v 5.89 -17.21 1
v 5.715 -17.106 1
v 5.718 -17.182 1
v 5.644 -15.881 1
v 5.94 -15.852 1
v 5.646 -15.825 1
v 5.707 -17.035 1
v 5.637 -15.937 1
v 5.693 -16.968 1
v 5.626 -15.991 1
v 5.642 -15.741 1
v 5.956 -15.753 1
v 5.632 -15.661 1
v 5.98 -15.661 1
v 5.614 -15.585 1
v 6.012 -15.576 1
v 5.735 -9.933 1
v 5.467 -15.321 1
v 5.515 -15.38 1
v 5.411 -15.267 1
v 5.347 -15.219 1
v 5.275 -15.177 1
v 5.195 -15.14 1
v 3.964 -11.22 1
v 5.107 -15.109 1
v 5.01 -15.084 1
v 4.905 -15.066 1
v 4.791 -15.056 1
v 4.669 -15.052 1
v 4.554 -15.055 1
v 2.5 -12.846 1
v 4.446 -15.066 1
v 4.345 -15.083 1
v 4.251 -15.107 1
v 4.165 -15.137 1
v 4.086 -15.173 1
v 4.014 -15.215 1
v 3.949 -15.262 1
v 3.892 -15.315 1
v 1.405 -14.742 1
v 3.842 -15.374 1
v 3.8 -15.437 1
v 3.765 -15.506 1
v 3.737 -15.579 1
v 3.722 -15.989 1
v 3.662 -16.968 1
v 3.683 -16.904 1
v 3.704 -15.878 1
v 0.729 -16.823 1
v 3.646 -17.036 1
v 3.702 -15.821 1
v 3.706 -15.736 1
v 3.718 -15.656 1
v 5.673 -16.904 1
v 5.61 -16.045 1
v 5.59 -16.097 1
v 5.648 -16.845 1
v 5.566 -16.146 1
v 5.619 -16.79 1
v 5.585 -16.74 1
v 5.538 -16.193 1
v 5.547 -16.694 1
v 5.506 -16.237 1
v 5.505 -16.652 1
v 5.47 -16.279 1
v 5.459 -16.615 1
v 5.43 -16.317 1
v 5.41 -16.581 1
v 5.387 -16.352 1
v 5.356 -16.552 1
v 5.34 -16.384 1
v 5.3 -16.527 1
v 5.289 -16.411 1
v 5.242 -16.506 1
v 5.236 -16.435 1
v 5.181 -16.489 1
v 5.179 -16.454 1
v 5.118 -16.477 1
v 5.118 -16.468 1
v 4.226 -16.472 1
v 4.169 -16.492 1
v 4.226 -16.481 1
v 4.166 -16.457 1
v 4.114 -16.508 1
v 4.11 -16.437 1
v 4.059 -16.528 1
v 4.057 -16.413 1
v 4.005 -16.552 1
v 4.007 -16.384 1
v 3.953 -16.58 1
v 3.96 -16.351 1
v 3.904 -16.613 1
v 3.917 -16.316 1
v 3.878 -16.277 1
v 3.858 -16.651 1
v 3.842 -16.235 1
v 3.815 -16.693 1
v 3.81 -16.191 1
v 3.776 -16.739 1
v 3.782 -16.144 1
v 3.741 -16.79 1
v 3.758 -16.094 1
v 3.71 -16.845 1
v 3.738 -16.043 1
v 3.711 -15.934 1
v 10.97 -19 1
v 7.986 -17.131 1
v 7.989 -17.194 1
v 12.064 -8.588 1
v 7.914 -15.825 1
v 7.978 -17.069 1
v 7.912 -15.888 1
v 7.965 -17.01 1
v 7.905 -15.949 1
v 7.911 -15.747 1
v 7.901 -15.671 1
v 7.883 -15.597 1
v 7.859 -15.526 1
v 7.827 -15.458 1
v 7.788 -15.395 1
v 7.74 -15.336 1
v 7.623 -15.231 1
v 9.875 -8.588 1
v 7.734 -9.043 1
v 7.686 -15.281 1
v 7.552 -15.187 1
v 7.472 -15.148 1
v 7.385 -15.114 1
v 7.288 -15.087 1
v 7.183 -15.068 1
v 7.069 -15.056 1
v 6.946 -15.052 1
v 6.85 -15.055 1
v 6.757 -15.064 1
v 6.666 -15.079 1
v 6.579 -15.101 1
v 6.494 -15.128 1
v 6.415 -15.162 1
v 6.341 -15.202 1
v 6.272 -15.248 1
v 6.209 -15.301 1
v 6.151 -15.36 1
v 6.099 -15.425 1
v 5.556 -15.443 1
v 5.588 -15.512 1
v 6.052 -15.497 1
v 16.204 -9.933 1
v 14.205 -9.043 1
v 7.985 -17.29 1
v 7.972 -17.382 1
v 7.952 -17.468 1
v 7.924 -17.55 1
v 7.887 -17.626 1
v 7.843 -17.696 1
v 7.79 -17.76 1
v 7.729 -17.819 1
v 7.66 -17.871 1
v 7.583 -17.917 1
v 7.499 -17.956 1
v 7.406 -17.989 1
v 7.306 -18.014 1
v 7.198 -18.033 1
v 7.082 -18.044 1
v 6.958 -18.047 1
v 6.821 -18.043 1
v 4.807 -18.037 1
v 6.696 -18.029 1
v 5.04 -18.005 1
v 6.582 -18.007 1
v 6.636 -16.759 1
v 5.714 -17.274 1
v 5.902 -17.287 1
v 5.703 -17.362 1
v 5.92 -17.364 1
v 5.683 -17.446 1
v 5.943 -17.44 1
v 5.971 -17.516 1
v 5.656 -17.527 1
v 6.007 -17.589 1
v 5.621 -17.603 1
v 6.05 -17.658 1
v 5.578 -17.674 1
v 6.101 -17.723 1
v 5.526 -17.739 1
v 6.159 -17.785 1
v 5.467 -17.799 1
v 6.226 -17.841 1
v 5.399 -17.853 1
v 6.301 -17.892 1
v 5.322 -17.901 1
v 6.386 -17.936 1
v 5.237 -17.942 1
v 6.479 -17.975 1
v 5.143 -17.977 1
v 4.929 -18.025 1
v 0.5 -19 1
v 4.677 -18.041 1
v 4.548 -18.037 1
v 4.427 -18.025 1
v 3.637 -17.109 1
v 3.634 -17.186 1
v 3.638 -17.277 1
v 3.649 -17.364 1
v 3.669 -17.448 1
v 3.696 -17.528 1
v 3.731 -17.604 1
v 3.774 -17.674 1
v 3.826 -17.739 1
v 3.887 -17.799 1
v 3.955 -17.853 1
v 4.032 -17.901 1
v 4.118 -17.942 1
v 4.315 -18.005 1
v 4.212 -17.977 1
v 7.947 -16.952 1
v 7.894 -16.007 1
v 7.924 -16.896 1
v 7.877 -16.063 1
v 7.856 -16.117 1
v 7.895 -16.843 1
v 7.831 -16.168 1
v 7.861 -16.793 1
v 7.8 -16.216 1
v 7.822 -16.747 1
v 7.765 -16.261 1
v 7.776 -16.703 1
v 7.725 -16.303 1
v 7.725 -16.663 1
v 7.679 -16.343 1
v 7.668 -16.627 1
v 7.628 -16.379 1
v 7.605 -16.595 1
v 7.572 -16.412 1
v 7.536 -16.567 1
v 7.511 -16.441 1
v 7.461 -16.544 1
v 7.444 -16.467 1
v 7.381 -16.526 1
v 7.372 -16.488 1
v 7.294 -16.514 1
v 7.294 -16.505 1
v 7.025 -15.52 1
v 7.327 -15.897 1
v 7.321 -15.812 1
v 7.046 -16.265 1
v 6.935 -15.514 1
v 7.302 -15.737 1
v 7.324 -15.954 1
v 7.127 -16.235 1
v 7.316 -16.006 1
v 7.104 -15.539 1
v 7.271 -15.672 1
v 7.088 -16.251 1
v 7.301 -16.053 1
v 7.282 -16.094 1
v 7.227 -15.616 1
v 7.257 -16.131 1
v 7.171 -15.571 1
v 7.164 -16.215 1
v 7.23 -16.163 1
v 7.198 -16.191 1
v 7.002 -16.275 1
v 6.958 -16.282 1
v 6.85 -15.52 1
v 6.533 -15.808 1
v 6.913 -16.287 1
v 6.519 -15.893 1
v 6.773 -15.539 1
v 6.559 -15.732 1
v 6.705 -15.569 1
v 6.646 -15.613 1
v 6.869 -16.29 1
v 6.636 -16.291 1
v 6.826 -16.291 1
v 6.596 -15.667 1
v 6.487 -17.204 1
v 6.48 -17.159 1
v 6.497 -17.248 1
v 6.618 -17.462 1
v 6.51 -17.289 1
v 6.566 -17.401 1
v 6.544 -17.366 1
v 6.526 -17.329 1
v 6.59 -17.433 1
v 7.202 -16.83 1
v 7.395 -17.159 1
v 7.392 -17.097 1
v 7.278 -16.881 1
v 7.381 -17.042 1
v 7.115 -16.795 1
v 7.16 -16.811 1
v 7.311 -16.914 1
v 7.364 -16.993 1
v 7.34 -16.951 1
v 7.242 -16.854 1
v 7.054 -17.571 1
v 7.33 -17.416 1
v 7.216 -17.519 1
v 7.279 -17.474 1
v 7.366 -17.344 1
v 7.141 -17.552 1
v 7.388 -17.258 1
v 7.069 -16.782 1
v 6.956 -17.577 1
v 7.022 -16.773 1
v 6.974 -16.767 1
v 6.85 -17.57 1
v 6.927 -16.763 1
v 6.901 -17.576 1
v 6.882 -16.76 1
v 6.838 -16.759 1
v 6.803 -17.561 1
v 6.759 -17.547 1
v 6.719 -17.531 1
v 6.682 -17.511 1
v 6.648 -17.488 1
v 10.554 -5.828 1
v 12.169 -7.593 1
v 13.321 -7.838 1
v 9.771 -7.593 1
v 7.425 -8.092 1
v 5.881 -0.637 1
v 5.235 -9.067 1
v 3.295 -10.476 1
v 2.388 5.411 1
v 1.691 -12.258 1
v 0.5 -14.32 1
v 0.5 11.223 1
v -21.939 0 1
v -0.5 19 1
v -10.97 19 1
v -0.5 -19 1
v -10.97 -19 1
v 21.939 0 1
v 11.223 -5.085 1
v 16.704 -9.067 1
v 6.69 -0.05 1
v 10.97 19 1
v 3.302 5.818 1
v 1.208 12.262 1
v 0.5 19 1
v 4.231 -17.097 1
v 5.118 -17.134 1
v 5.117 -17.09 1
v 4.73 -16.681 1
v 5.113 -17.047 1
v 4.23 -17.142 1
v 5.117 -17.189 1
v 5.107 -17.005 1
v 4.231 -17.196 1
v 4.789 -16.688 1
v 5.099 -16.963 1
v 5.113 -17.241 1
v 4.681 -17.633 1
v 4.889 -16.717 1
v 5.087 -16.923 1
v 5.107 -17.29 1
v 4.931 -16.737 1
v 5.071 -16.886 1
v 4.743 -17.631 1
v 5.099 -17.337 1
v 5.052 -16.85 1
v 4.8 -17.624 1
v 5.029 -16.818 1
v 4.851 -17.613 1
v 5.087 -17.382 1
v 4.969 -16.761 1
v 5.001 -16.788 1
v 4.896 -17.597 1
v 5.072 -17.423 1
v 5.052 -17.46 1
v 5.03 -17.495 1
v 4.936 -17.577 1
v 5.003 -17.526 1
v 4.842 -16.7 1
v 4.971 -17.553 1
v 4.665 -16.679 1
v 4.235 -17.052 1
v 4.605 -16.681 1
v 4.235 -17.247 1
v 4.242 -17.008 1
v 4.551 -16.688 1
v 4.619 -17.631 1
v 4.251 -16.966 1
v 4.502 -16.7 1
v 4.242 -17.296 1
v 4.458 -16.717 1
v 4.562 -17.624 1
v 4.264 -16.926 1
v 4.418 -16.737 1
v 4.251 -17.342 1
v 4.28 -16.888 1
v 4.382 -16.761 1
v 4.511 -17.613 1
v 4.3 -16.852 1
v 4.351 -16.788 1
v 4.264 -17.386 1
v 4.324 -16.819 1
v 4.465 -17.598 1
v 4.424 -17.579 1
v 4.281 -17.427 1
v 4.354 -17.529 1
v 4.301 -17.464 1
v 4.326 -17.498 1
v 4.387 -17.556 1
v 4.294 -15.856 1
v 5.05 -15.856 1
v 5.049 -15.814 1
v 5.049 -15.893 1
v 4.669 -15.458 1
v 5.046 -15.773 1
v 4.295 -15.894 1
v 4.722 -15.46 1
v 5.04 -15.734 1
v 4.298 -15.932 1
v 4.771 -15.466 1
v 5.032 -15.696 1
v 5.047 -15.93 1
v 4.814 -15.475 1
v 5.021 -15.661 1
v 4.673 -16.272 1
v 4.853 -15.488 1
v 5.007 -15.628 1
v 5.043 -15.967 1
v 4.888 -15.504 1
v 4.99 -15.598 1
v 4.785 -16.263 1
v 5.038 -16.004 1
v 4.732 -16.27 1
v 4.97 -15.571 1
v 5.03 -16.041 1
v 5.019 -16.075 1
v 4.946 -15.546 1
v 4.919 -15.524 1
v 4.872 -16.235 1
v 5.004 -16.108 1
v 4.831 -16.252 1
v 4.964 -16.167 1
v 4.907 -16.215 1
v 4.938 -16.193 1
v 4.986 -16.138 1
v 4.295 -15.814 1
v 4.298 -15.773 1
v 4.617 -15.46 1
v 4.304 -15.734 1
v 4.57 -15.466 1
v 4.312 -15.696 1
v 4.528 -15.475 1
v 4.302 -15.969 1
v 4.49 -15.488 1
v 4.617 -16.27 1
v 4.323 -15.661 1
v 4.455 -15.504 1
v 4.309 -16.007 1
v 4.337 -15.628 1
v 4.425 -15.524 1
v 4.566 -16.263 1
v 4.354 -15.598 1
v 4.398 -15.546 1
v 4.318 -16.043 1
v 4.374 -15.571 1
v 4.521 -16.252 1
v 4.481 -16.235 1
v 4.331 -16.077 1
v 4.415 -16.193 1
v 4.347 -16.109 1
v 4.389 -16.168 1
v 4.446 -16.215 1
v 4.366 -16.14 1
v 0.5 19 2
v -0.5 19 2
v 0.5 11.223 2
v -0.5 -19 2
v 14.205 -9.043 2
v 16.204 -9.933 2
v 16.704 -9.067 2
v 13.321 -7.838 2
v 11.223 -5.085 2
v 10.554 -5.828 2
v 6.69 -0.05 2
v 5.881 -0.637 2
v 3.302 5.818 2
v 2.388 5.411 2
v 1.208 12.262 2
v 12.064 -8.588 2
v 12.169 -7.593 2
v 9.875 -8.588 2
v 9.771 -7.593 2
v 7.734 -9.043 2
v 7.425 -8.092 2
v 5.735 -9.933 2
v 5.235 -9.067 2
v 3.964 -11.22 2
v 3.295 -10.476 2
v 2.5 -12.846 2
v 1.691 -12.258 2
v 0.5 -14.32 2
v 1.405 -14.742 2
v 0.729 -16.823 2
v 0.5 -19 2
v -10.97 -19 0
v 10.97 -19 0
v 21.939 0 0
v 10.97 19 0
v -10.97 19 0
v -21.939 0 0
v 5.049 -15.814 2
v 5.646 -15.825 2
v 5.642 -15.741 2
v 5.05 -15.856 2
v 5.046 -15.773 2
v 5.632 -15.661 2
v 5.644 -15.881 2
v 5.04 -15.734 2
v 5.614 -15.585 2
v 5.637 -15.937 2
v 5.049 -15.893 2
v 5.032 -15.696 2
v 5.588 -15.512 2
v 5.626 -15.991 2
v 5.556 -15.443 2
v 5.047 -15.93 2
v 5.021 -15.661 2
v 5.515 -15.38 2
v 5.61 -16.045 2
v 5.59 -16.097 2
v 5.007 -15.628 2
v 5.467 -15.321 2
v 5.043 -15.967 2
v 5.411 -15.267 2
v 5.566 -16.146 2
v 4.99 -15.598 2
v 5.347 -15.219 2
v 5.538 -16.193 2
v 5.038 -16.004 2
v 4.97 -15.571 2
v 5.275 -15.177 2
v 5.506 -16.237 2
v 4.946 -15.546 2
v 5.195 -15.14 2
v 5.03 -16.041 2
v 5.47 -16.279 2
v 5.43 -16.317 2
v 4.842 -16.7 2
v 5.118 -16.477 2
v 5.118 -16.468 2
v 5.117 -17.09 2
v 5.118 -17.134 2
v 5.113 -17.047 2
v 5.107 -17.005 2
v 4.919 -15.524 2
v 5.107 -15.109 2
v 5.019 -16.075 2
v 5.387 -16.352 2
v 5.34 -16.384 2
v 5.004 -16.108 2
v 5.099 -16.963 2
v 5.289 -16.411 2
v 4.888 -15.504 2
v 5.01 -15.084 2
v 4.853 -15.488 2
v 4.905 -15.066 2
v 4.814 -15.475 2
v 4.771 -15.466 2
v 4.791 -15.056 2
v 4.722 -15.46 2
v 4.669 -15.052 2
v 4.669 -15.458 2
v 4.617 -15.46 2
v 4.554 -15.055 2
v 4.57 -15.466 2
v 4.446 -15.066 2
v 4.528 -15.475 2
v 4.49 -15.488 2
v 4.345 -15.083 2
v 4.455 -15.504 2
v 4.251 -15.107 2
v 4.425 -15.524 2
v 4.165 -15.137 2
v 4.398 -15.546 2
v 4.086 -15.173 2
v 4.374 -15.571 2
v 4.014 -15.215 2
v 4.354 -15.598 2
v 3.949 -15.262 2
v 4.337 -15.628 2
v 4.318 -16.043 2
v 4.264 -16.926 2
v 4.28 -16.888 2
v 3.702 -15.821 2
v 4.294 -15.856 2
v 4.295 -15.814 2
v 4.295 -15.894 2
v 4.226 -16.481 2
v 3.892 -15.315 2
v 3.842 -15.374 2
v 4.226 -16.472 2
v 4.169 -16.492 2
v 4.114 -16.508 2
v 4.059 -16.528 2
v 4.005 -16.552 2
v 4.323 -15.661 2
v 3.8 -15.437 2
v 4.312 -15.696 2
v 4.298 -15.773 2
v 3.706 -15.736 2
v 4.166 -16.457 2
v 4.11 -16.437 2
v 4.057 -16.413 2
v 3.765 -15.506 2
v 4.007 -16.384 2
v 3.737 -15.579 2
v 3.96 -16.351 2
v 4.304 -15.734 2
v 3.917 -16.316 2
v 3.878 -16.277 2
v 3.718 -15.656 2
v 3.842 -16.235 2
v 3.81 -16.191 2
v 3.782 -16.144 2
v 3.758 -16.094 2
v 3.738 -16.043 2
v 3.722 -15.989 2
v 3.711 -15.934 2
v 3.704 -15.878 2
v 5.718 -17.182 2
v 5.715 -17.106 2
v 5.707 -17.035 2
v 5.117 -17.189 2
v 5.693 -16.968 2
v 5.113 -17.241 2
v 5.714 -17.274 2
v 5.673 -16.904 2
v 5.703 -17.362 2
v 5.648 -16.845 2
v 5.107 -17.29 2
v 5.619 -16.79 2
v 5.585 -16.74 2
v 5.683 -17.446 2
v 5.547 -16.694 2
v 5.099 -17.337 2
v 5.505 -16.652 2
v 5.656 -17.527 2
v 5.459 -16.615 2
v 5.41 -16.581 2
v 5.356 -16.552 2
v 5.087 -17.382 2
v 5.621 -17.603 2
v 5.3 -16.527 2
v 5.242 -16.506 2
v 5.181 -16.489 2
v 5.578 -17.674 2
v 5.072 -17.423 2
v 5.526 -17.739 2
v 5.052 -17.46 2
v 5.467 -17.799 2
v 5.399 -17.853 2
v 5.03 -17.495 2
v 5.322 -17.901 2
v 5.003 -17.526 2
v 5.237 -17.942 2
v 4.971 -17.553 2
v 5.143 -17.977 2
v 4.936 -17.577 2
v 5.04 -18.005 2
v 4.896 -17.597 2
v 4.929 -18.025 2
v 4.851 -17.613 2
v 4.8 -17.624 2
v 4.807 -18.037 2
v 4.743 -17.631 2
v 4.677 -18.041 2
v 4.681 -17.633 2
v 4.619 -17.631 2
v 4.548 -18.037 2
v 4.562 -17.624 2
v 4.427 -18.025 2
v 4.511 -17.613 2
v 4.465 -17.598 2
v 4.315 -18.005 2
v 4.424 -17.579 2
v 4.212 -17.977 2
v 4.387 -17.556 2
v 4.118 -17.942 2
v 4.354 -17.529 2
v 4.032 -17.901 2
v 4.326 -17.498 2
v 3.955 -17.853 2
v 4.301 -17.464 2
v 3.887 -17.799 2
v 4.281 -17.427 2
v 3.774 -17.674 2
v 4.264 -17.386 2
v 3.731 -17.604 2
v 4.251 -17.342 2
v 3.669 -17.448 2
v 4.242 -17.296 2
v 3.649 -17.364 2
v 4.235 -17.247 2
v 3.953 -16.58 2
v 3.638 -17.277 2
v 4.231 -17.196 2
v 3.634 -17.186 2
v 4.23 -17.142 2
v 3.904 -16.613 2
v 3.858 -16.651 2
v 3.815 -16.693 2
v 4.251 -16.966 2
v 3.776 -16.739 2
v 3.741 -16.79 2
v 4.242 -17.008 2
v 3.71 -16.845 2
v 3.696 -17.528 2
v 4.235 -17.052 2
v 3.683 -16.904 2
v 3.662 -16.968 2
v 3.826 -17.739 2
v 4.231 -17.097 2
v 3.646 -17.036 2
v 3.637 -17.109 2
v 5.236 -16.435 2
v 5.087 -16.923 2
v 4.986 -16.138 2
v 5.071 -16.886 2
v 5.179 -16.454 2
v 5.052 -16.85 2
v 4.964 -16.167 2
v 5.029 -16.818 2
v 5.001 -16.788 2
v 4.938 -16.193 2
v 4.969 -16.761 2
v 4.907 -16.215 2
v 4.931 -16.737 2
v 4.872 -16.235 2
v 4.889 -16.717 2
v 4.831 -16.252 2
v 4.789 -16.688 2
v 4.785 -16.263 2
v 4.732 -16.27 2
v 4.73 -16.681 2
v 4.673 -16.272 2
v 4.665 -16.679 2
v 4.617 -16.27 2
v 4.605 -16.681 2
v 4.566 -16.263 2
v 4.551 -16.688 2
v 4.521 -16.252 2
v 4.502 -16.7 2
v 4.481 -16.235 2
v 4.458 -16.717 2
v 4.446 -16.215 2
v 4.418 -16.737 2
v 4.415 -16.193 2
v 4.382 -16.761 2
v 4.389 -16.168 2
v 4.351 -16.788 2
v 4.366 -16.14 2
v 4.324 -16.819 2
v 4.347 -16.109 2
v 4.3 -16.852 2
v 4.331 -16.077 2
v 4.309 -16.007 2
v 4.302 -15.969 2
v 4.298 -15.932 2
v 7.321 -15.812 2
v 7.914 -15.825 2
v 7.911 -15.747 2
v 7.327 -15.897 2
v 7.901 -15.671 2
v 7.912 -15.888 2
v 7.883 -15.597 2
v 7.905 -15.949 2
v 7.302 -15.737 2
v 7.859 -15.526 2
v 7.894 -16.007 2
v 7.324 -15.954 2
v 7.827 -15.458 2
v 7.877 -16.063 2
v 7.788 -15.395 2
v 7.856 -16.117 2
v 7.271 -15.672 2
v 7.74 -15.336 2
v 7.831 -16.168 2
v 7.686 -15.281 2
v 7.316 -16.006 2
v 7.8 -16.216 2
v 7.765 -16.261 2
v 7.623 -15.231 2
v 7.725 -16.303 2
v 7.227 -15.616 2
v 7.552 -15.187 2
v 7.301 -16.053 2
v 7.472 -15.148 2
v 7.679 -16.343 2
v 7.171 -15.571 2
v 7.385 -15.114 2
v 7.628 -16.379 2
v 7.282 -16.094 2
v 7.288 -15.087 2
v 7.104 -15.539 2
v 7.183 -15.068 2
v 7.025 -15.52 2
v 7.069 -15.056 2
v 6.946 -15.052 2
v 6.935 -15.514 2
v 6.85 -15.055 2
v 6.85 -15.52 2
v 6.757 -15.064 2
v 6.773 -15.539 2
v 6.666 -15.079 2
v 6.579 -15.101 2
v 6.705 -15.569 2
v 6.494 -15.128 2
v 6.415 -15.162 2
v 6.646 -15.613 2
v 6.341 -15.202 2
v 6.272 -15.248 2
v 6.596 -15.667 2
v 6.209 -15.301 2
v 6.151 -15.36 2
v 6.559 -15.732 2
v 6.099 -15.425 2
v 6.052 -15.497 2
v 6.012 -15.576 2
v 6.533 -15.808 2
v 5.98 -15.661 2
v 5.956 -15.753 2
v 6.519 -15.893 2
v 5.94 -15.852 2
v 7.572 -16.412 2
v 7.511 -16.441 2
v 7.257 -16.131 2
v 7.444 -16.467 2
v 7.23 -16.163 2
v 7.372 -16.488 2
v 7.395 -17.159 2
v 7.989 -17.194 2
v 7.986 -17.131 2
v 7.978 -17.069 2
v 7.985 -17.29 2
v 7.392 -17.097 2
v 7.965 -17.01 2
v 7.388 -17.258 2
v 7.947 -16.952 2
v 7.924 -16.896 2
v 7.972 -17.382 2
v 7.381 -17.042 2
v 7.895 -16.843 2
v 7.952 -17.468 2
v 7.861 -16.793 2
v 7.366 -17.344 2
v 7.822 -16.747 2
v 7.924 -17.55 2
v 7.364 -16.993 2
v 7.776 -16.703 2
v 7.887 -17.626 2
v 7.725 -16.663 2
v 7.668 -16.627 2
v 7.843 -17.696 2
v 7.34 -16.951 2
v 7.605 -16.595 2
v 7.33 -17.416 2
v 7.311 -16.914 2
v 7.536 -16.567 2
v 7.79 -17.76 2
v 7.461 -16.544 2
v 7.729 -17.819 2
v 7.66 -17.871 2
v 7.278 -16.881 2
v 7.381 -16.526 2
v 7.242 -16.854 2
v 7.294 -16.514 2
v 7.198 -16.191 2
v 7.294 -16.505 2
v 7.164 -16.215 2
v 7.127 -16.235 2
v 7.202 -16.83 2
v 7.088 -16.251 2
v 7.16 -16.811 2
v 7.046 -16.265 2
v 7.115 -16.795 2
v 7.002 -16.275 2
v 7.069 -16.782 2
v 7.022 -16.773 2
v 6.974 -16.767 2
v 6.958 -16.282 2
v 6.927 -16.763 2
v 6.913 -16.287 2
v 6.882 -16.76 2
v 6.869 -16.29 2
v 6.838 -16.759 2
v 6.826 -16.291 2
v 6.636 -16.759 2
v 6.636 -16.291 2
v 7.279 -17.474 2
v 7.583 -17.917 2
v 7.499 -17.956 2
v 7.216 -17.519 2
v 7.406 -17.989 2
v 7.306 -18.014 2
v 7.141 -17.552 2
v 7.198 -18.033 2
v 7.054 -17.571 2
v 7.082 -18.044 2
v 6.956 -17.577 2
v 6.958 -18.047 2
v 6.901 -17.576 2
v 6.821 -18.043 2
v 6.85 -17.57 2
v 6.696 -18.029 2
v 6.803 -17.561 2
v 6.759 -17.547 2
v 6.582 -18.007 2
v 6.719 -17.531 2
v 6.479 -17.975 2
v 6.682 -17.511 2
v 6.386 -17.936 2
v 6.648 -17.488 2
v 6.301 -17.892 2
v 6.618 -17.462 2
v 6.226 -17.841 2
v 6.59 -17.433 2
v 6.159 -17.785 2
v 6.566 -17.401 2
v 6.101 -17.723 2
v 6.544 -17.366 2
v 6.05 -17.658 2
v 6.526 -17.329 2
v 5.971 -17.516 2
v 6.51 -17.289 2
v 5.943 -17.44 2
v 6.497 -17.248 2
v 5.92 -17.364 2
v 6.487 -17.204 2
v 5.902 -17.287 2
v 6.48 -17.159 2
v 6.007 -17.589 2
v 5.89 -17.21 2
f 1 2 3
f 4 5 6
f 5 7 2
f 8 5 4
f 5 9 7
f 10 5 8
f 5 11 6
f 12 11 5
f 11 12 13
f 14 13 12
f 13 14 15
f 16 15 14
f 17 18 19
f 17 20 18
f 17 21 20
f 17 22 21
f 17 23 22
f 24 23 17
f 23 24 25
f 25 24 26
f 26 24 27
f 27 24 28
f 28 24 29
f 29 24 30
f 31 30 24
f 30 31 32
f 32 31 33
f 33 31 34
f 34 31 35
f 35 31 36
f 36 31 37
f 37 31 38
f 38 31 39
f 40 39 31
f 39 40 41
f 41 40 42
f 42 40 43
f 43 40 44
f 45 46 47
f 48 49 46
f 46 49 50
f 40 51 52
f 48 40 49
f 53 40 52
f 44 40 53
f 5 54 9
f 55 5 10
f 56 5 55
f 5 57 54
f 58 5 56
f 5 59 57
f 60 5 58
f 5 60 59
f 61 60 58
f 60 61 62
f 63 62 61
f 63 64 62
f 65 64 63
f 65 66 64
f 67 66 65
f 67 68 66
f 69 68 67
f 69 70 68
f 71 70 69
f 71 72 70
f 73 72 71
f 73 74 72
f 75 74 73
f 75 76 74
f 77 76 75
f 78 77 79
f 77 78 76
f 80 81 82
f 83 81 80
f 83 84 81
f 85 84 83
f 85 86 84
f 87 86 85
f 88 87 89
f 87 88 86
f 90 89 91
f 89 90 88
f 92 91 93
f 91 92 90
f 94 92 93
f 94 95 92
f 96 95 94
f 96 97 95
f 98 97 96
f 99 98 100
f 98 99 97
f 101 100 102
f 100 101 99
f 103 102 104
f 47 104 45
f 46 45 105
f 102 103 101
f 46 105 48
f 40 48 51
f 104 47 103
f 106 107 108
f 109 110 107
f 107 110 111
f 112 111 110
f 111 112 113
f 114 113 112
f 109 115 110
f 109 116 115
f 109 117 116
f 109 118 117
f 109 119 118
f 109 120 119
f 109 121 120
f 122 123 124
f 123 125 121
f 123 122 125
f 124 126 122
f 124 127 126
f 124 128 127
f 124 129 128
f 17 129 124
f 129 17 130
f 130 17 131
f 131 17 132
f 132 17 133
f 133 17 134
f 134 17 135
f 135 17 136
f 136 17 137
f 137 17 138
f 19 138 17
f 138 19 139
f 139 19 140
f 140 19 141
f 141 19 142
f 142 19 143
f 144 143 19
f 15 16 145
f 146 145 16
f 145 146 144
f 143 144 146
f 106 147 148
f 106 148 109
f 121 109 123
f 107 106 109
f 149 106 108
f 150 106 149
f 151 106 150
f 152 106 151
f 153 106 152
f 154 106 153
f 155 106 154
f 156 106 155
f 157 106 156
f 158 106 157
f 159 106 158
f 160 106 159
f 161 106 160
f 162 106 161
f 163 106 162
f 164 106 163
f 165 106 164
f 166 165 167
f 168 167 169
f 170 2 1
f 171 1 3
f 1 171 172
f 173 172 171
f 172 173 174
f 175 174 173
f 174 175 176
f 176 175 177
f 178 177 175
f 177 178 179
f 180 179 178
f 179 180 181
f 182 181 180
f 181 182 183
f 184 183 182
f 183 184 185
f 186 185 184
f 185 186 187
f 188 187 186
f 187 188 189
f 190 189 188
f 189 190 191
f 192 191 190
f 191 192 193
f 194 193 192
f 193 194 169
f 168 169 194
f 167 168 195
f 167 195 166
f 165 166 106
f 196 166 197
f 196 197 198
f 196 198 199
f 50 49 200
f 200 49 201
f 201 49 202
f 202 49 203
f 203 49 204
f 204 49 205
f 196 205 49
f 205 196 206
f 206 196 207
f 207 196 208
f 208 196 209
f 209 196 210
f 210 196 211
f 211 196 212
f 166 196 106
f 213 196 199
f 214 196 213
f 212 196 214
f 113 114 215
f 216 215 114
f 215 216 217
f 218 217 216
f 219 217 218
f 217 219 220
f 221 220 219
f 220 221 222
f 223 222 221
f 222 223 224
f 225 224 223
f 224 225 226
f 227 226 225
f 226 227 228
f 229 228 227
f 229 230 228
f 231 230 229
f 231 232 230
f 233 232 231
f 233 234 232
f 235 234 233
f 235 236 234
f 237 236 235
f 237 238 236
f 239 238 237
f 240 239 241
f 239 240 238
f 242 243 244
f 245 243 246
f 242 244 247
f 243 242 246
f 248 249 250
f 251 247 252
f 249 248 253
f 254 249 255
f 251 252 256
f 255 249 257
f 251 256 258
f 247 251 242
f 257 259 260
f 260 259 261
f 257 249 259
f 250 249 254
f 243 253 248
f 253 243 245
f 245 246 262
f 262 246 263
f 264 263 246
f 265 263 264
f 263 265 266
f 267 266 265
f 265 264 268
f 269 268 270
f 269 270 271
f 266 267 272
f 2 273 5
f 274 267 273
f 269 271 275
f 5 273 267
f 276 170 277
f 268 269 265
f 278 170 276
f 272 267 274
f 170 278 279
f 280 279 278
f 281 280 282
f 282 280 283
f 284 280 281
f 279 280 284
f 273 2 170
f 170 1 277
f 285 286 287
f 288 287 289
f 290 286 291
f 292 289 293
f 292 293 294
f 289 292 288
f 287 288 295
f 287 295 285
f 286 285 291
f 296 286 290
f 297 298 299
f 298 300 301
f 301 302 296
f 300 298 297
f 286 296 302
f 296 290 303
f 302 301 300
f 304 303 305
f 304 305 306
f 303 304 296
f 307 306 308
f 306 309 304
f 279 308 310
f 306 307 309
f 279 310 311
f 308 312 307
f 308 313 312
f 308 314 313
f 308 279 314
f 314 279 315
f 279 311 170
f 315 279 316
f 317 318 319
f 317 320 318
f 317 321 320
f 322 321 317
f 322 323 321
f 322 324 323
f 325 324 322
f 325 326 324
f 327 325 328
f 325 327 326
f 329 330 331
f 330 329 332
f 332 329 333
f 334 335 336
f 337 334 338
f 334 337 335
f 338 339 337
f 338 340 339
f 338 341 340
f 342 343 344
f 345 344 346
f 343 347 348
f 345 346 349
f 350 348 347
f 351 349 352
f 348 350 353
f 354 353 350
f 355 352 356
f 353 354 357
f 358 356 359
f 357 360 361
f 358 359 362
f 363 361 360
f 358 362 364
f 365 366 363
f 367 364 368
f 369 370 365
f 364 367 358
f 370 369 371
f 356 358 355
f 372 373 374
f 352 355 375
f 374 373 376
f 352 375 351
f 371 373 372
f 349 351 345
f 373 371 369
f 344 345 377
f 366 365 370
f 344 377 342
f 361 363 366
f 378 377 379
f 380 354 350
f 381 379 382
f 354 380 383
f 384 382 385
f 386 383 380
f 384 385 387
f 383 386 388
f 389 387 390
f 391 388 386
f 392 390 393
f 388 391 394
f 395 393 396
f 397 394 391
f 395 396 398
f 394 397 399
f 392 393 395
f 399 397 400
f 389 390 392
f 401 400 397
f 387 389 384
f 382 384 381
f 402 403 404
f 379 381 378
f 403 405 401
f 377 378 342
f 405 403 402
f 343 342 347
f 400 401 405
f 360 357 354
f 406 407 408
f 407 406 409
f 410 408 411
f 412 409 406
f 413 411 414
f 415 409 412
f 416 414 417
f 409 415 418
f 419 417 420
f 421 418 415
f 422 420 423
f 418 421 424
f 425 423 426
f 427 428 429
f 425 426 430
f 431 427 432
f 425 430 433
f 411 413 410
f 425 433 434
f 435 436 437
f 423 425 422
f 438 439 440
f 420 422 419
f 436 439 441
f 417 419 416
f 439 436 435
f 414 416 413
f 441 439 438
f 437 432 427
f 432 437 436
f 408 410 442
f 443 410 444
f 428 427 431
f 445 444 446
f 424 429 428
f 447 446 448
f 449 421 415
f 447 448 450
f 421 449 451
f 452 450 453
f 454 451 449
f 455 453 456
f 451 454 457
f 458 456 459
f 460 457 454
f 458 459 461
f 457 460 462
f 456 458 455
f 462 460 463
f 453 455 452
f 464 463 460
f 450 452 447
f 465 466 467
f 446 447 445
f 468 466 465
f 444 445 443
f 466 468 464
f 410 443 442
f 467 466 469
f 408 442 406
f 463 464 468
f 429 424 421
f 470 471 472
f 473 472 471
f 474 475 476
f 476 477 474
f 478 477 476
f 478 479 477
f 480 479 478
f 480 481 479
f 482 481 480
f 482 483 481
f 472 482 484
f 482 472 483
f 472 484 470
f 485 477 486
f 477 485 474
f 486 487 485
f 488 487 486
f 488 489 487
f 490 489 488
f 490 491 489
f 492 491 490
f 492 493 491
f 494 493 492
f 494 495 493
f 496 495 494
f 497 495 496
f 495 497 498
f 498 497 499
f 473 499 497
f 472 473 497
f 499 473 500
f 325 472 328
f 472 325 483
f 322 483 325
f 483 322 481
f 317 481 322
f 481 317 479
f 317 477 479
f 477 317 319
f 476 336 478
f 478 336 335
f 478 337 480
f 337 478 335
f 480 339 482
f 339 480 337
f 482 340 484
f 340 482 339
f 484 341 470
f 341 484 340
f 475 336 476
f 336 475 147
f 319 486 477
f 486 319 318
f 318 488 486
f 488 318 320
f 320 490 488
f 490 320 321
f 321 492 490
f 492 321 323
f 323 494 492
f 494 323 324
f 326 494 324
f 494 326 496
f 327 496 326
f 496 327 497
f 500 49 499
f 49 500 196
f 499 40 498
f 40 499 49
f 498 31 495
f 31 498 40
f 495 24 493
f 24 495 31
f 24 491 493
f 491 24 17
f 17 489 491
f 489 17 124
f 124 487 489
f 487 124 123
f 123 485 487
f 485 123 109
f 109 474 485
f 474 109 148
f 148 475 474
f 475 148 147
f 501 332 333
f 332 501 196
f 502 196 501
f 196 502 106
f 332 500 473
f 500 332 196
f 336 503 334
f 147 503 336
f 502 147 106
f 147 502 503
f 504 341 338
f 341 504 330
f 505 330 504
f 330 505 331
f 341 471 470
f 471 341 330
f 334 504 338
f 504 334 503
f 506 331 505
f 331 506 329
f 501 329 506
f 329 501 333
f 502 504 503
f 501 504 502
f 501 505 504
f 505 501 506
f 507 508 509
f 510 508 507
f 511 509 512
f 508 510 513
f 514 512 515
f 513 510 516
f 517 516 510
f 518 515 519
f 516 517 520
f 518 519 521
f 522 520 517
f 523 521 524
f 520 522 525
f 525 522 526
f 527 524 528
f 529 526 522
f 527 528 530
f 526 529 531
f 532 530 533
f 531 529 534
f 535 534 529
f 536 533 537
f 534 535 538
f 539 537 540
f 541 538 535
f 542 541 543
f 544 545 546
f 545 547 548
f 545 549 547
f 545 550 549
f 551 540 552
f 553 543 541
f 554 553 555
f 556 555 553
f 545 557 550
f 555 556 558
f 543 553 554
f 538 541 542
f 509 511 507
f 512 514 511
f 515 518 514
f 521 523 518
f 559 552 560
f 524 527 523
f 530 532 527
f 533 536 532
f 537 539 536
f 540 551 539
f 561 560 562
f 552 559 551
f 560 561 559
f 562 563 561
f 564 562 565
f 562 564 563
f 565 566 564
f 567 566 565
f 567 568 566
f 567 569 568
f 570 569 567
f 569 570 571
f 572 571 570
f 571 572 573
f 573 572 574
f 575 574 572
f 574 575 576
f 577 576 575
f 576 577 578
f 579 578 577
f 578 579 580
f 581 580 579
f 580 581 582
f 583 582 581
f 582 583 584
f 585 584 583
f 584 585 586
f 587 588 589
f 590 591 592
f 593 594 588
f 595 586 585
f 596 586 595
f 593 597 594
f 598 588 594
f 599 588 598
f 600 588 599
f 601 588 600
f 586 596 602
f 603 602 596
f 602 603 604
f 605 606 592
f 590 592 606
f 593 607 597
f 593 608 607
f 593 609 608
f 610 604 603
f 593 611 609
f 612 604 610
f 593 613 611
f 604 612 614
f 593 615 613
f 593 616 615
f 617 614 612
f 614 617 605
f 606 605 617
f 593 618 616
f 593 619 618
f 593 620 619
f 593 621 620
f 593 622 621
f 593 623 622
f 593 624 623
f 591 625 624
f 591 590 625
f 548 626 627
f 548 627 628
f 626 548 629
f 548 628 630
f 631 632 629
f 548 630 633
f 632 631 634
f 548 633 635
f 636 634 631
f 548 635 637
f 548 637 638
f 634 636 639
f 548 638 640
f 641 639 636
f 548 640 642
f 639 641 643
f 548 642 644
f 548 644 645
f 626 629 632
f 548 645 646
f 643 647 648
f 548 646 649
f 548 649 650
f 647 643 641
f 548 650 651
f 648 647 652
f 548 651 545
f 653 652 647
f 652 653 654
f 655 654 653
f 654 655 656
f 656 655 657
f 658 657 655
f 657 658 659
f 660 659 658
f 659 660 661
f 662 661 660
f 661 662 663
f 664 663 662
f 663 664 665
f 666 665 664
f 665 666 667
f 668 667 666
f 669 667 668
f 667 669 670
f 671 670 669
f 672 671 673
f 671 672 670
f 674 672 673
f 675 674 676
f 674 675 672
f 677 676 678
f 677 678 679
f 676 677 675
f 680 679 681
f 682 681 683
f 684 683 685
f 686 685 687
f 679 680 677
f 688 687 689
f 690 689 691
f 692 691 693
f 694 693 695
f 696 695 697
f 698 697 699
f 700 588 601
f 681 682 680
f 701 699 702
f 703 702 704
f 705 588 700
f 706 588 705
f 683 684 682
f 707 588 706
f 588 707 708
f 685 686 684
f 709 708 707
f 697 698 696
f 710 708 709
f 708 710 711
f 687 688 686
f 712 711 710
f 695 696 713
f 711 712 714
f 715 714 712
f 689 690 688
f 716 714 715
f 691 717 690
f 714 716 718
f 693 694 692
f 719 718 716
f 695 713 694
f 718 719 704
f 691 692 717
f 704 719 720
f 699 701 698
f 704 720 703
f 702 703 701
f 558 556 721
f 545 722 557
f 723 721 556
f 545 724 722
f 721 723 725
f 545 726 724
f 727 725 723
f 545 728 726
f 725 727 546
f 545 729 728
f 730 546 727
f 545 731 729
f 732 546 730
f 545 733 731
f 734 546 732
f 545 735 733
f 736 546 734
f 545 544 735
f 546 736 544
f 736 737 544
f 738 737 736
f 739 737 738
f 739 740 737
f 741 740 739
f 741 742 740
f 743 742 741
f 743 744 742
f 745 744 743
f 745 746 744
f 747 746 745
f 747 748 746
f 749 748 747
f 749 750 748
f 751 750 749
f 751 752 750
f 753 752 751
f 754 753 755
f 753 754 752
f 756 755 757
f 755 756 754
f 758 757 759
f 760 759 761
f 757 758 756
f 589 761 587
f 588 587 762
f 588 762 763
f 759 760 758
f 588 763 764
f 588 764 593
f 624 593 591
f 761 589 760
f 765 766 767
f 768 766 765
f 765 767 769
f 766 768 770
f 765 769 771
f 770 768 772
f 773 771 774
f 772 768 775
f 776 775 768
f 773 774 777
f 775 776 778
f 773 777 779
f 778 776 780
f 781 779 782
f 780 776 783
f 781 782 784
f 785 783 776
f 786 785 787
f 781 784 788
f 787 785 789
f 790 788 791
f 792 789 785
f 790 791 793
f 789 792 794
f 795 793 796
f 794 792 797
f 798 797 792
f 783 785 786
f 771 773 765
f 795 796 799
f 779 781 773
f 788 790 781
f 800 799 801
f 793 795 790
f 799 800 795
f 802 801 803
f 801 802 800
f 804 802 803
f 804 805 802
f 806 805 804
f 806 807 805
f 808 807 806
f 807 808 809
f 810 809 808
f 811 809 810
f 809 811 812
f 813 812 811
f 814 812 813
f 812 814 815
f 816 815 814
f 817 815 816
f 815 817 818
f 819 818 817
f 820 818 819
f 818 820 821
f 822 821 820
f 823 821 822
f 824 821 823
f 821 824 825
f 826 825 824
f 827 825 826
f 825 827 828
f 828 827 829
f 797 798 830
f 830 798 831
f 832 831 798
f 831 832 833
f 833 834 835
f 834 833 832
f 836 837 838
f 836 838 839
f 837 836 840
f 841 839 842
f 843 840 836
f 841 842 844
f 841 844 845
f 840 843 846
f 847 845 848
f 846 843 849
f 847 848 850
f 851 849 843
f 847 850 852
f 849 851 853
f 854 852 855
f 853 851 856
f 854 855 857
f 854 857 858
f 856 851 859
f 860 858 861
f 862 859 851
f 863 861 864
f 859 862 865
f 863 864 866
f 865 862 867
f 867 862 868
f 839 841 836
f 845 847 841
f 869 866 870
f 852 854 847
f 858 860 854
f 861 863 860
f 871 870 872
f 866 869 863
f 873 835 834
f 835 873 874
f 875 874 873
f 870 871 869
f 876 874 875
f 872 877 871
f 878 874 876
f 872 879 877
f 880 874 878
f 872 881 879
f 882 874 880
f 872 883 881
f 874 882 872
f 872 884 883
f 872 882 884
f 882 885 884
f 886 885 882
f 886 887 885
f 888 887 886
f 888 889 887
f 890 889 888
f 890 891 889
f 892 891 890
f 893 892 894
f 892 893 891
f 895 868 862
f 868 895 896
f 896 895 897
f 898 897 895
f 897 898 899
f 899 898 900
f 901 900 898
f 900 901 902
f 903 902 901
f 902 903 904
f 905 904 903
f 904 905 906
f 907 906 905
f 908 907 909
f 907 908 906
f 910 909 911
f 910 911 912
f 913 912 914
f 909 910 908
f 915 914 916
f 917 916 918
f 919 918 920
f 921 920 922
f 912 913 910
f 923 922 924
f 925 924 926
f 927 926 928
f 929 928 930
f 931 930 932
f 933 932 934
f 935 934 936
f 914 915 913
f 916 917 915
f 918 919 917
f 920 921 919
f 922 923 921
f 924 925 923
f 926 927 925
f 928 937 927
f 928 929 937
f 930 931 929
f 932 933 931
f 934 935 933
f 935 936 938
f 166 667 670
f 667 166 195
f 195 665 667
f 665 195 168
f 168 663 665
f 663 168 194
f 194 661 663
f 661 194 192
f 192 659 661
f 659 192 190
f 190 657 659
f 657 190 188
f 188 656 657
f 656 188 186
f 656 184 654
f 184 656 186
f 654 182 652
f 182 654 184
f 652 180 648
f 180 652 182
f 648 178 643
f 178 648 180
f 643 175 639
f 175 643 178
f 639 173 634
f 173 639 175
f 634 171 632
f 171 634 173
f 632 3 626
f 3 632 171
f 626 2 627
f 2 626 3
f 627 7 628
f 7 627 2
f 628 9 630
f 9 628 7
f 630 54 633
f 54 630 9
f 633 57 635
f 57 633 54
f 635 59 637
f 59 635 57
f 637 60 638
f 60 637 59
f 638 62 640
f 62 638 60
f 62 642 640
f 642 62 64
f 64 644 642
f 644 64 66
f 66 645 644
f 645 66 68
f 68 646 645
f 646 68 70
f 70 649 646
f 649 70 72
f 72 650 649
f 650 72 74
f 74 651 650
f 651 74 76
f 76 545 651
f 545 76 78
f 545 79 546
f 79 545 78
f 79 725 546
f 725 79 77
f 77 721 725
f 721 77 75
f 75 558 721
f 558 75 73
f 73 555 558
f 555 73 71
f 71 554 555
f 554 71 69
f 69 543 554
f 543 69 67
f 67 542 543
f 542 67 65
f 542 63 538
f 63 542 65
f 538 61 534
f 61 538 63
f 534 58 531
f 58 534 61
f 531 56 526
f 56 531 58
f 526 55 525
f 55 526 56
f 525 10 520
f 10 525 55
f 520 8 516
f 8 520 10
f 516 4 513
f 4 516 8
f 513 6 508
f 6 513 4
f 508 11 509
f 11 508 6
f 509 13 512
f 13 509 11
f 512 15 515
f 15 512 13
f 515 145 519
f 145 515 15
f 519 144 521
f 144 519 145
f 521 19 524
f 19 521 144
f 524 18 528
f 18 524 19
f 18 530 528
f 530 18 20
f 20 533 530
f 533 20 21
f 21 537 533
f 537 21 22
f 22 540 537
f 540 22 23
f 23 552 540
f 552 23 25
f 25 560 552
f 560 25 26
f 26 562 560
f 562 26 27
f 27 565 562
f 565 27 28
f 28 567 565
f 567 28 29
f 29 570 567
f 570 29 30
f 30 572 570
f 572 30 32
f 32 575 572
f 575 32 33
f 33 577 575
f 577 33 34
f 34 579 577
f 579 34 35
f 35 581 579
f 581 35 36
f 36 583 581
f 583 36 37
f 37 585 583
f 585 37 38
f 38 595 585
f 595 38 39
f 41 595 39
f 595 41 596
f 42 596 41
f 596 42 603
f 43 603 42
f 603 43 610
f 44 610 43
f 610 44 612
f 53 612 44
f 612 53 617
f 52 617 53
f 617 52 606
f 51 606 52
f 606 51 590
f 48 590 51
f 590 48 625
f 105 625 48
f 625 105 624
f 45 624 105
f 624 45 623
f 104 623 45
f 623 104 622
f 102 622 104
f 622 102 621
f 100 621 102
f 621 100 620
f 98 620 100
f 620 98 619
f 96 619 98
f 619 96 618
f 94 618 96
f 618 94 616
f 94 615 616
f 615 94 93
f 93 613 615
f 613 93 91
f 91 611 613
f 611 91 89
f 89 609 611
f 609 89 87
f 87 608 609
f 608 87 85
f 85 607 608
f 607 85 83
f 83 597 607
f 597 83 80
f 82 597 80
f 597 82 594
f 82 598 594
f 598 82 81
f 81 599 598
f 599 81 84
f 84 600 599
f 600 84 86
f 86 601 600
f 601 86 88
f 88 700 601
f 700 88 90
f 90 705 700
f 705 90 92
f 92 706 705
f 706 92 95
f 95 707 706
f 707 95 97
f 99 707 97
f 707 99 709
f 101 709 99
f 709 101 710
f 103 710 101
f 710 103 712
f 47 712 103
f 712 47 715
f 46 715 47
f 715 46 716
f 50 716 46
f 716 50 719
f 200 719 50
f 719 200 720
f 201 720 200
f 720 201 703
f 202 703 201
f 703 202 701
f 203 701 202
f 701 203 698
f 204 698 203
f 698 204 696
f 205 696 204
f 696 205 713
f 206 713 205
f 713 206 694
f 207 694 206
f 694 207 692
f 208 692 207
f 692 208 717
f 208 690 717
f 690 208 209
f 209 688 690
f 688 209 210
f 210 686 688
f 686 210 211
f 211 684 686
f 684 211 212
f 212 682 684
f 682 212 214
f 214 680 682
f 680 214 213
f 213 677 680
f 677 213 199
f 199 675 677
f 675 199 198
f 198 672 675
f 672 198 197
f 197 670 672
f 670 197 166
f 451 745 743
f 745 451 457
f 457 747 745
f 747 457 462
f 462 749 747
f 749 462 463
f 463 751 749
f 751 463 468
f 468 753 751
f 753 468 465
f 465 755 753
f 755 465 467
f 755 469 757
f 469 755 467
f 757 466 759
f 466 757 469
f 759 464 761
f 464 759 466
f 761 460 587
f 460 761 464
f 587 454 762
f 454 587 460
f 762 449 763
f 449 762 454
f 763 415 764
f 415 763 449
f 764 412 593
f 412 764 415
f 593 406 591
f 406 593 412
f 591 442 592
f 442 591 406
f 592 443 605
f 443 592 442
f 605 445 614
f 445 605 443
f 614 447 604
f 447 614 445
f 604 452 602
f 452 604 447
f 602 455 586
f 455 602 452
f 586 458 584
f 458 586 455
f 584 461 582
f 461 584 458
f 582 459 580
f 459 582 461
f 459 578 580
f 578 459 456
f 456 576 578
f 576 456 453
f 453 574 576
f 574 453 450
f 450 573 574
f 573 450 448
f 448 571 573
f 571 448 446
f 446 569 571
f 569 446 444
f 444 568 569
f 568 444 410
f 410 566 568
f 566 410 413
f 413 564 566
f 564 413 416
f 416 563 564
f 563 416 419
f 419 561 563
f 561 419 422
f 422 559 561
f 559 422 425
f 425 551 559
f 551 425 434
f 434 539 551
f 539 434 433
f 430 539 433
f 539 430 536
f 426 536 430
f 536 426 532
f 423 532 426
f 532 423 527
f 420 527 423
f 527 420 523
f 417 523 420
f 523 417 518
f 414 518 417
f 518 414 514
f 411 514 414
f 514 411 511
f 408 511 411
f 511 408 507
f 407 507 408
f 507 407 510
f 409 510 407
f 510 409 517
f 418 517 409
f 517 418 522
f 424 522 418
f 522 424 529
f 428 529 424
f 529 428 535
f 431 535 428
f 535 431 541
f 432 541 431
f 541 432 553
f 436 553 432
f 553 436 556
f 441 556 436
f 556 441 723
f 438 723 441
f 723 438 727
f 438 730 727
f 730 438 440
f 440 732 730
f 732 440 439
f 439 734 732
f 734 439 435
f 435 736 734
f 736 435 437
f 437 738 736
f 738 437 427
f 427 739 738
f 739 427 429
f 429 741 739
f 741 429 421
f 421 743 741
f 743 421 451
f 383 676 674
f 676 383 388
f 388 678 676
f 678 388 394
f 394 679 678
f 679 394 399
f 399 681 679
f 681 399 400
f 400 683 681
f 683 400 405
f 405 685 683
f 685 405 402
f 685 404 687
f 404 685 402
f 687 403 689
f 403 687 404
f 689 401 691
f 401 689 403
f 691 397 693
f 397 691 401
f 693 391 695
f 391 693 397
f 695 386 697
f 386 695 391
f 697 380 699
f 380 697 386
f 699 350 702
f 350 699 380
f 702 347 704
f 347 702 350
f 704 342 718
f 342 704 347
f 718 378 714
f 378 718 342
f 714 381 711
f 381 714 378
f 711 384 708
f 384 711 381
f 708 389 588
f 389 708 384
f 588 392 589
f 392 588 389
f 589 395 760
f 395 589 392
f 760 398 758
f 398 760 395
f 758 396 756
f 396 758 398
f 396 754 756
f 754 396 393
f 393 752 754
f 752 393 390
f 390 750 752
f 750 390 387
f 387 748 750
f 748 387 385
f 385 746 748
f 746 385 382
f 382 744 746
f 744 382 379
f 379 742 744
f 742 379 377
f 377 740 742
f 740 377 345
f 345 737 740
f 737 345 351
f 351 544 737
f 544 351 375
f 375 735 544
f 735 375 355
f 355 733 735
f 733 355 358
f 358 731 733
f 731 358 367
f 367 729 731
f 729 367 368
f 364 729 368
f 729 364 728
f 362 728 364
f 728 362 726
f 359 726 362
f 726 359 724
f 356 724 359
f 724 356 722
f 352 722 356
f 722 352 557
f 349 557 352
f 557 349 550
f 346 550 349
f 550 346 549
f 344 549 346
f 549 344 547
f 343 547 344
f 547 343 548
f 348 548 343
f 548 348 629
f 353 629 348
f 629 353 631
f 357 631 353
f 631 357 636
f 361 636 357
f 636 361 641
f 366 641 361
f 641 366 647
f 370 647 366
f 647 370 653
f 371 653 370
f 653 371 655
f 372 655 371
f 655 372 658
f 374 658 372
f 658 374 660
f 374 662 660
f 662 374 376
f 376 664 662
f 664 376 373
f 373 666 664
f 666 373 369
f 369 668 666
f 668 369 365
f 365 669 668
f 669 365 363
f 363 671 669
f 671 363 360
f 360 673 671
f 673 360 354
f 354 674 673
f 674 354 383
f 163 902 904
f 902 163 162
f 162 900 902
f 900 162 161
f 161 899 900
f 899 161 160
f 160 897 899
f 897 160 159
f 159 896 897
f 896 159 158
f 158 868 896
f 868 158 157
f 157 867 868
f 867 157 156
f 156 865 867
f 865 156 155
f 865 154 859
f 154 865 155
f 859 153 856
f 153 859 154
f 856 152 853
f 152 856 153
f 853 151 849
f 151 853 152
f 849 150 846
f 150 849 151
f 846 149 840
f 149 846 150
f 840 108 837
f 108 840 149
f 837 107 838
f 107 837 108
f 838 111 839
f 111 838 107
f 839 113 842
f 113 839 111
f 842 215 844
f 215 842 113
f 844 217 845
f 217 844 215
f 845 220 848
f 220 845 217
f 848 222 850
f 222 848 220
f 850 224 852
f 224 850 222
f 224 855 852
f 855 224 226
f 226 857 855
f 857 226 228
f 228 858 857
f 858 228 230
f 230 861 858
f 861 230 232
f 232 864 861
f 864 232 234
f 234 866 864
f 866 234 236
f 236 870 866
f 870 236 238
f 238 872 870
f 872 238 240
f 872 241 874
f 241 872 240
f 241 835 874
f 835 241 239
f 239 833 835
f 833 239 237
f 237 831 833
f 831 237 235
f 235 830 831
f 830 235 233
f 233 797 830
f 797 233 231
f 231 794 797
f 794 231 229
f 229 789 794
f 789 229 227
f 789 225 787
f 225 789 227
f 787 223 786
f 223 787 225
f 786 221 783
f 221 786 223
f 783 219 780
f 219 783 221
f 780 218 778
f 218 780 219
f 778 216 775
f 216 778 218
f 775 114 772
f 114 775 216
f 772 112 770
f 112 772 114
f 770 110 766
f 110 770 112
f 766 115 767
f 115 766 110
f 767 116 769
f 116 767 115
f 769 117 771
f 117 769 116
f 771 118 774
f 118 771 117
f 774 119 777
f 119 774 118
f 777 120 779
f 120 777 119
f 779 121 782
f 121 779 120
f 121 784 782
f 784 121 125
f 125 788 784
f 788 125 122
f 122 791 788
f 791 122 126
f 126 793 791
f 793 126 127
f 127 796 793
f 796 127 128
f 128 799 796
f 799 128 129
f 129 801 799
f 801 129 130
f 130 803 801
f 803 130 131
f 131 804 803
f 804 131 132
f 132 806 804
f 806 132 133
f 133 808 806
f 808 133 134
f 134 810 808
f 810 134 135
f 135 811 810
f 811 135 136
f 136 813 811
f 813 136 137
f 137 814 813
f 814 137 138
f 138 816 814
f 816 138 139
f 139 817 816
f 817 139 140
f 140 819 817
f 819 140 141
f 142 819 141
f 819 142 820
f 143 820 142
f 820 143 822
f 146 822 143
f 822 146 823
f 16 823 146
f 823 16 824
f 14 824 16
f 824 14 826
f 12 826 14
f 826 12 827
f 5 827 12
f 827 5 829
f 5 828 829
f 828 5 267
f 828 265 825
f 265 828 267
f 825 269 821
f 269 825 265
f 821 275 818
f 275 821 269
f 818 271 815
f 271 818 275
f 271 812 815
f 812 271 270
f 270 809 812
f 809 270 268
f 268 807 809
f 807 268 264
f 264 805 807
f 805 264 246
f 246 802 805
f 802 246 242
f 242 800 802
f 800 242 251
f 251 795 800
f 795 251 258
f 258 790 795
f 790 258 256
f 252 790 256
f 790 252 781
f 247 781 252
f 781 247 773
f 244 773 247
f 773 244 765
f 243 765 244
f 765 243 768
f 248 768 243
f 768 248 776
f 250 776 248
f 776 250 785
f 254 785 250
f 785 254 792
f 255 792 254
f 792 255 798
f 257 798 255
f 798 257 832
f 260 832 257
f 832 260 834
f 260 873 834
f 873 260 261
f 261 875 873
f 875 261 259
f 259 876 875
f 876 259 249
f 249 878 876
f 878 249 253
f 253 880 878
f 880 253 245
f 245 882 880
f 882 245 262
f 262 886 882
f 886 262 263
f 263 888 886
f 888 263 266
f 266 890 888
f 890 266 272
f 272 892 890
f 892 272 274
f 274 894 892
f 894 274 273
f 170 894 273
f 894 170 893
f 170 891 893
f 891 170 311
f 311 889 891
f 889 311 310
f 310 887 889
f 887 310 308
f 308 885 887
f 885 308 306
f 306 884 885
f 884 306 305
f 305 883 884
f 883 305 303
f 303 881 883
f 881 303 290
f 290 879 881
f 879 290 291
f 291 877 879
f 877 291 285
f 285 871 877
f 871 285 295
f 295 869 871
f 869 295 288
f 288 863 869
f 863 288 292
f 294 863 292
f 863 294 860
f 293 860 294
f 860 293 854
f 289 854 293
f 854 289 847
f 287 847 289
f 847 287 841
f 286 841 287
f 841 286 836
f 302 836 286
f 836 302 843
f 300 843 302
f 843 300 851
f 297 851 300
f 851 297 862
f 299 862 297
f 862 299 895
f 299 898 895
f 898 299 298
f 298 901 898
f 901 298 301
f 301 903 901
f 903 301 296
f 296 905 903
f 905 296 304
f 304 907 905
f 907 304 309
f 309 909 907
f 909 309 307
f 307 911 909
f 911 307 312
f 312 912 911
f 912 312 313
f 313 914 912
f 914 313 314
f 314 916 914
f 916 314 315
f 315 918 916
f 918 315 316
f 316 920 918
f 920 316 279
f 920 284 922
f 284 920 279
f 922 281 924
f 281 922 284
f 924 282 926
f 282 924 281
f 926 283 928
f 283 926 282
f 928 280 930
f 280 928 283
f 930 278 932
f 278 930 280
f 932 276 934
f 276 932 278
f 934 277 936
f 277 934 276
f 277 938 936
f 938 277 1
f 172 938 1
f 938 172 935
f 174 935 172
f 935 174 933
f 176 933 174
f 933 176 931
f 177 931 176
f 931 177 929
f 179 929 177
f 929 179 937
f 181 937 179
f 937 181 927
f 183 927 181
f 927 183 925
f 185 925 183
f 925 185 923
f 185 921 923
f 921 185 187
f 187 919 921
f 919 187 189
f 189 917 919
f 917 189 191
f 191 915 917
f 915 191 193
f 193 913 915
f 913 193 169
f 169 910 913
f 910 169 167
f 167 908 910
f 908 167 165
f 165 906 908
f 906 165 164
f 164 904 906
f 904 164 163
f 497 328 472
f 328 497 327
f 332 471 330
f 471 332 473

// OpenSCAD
include <../Scripts/18xx tiles basic functions.scad>
hex("Brown");
put_tilenr("83");
light_curve(r=1);
sharp_curve(r=0);
straight_line(r=3);
